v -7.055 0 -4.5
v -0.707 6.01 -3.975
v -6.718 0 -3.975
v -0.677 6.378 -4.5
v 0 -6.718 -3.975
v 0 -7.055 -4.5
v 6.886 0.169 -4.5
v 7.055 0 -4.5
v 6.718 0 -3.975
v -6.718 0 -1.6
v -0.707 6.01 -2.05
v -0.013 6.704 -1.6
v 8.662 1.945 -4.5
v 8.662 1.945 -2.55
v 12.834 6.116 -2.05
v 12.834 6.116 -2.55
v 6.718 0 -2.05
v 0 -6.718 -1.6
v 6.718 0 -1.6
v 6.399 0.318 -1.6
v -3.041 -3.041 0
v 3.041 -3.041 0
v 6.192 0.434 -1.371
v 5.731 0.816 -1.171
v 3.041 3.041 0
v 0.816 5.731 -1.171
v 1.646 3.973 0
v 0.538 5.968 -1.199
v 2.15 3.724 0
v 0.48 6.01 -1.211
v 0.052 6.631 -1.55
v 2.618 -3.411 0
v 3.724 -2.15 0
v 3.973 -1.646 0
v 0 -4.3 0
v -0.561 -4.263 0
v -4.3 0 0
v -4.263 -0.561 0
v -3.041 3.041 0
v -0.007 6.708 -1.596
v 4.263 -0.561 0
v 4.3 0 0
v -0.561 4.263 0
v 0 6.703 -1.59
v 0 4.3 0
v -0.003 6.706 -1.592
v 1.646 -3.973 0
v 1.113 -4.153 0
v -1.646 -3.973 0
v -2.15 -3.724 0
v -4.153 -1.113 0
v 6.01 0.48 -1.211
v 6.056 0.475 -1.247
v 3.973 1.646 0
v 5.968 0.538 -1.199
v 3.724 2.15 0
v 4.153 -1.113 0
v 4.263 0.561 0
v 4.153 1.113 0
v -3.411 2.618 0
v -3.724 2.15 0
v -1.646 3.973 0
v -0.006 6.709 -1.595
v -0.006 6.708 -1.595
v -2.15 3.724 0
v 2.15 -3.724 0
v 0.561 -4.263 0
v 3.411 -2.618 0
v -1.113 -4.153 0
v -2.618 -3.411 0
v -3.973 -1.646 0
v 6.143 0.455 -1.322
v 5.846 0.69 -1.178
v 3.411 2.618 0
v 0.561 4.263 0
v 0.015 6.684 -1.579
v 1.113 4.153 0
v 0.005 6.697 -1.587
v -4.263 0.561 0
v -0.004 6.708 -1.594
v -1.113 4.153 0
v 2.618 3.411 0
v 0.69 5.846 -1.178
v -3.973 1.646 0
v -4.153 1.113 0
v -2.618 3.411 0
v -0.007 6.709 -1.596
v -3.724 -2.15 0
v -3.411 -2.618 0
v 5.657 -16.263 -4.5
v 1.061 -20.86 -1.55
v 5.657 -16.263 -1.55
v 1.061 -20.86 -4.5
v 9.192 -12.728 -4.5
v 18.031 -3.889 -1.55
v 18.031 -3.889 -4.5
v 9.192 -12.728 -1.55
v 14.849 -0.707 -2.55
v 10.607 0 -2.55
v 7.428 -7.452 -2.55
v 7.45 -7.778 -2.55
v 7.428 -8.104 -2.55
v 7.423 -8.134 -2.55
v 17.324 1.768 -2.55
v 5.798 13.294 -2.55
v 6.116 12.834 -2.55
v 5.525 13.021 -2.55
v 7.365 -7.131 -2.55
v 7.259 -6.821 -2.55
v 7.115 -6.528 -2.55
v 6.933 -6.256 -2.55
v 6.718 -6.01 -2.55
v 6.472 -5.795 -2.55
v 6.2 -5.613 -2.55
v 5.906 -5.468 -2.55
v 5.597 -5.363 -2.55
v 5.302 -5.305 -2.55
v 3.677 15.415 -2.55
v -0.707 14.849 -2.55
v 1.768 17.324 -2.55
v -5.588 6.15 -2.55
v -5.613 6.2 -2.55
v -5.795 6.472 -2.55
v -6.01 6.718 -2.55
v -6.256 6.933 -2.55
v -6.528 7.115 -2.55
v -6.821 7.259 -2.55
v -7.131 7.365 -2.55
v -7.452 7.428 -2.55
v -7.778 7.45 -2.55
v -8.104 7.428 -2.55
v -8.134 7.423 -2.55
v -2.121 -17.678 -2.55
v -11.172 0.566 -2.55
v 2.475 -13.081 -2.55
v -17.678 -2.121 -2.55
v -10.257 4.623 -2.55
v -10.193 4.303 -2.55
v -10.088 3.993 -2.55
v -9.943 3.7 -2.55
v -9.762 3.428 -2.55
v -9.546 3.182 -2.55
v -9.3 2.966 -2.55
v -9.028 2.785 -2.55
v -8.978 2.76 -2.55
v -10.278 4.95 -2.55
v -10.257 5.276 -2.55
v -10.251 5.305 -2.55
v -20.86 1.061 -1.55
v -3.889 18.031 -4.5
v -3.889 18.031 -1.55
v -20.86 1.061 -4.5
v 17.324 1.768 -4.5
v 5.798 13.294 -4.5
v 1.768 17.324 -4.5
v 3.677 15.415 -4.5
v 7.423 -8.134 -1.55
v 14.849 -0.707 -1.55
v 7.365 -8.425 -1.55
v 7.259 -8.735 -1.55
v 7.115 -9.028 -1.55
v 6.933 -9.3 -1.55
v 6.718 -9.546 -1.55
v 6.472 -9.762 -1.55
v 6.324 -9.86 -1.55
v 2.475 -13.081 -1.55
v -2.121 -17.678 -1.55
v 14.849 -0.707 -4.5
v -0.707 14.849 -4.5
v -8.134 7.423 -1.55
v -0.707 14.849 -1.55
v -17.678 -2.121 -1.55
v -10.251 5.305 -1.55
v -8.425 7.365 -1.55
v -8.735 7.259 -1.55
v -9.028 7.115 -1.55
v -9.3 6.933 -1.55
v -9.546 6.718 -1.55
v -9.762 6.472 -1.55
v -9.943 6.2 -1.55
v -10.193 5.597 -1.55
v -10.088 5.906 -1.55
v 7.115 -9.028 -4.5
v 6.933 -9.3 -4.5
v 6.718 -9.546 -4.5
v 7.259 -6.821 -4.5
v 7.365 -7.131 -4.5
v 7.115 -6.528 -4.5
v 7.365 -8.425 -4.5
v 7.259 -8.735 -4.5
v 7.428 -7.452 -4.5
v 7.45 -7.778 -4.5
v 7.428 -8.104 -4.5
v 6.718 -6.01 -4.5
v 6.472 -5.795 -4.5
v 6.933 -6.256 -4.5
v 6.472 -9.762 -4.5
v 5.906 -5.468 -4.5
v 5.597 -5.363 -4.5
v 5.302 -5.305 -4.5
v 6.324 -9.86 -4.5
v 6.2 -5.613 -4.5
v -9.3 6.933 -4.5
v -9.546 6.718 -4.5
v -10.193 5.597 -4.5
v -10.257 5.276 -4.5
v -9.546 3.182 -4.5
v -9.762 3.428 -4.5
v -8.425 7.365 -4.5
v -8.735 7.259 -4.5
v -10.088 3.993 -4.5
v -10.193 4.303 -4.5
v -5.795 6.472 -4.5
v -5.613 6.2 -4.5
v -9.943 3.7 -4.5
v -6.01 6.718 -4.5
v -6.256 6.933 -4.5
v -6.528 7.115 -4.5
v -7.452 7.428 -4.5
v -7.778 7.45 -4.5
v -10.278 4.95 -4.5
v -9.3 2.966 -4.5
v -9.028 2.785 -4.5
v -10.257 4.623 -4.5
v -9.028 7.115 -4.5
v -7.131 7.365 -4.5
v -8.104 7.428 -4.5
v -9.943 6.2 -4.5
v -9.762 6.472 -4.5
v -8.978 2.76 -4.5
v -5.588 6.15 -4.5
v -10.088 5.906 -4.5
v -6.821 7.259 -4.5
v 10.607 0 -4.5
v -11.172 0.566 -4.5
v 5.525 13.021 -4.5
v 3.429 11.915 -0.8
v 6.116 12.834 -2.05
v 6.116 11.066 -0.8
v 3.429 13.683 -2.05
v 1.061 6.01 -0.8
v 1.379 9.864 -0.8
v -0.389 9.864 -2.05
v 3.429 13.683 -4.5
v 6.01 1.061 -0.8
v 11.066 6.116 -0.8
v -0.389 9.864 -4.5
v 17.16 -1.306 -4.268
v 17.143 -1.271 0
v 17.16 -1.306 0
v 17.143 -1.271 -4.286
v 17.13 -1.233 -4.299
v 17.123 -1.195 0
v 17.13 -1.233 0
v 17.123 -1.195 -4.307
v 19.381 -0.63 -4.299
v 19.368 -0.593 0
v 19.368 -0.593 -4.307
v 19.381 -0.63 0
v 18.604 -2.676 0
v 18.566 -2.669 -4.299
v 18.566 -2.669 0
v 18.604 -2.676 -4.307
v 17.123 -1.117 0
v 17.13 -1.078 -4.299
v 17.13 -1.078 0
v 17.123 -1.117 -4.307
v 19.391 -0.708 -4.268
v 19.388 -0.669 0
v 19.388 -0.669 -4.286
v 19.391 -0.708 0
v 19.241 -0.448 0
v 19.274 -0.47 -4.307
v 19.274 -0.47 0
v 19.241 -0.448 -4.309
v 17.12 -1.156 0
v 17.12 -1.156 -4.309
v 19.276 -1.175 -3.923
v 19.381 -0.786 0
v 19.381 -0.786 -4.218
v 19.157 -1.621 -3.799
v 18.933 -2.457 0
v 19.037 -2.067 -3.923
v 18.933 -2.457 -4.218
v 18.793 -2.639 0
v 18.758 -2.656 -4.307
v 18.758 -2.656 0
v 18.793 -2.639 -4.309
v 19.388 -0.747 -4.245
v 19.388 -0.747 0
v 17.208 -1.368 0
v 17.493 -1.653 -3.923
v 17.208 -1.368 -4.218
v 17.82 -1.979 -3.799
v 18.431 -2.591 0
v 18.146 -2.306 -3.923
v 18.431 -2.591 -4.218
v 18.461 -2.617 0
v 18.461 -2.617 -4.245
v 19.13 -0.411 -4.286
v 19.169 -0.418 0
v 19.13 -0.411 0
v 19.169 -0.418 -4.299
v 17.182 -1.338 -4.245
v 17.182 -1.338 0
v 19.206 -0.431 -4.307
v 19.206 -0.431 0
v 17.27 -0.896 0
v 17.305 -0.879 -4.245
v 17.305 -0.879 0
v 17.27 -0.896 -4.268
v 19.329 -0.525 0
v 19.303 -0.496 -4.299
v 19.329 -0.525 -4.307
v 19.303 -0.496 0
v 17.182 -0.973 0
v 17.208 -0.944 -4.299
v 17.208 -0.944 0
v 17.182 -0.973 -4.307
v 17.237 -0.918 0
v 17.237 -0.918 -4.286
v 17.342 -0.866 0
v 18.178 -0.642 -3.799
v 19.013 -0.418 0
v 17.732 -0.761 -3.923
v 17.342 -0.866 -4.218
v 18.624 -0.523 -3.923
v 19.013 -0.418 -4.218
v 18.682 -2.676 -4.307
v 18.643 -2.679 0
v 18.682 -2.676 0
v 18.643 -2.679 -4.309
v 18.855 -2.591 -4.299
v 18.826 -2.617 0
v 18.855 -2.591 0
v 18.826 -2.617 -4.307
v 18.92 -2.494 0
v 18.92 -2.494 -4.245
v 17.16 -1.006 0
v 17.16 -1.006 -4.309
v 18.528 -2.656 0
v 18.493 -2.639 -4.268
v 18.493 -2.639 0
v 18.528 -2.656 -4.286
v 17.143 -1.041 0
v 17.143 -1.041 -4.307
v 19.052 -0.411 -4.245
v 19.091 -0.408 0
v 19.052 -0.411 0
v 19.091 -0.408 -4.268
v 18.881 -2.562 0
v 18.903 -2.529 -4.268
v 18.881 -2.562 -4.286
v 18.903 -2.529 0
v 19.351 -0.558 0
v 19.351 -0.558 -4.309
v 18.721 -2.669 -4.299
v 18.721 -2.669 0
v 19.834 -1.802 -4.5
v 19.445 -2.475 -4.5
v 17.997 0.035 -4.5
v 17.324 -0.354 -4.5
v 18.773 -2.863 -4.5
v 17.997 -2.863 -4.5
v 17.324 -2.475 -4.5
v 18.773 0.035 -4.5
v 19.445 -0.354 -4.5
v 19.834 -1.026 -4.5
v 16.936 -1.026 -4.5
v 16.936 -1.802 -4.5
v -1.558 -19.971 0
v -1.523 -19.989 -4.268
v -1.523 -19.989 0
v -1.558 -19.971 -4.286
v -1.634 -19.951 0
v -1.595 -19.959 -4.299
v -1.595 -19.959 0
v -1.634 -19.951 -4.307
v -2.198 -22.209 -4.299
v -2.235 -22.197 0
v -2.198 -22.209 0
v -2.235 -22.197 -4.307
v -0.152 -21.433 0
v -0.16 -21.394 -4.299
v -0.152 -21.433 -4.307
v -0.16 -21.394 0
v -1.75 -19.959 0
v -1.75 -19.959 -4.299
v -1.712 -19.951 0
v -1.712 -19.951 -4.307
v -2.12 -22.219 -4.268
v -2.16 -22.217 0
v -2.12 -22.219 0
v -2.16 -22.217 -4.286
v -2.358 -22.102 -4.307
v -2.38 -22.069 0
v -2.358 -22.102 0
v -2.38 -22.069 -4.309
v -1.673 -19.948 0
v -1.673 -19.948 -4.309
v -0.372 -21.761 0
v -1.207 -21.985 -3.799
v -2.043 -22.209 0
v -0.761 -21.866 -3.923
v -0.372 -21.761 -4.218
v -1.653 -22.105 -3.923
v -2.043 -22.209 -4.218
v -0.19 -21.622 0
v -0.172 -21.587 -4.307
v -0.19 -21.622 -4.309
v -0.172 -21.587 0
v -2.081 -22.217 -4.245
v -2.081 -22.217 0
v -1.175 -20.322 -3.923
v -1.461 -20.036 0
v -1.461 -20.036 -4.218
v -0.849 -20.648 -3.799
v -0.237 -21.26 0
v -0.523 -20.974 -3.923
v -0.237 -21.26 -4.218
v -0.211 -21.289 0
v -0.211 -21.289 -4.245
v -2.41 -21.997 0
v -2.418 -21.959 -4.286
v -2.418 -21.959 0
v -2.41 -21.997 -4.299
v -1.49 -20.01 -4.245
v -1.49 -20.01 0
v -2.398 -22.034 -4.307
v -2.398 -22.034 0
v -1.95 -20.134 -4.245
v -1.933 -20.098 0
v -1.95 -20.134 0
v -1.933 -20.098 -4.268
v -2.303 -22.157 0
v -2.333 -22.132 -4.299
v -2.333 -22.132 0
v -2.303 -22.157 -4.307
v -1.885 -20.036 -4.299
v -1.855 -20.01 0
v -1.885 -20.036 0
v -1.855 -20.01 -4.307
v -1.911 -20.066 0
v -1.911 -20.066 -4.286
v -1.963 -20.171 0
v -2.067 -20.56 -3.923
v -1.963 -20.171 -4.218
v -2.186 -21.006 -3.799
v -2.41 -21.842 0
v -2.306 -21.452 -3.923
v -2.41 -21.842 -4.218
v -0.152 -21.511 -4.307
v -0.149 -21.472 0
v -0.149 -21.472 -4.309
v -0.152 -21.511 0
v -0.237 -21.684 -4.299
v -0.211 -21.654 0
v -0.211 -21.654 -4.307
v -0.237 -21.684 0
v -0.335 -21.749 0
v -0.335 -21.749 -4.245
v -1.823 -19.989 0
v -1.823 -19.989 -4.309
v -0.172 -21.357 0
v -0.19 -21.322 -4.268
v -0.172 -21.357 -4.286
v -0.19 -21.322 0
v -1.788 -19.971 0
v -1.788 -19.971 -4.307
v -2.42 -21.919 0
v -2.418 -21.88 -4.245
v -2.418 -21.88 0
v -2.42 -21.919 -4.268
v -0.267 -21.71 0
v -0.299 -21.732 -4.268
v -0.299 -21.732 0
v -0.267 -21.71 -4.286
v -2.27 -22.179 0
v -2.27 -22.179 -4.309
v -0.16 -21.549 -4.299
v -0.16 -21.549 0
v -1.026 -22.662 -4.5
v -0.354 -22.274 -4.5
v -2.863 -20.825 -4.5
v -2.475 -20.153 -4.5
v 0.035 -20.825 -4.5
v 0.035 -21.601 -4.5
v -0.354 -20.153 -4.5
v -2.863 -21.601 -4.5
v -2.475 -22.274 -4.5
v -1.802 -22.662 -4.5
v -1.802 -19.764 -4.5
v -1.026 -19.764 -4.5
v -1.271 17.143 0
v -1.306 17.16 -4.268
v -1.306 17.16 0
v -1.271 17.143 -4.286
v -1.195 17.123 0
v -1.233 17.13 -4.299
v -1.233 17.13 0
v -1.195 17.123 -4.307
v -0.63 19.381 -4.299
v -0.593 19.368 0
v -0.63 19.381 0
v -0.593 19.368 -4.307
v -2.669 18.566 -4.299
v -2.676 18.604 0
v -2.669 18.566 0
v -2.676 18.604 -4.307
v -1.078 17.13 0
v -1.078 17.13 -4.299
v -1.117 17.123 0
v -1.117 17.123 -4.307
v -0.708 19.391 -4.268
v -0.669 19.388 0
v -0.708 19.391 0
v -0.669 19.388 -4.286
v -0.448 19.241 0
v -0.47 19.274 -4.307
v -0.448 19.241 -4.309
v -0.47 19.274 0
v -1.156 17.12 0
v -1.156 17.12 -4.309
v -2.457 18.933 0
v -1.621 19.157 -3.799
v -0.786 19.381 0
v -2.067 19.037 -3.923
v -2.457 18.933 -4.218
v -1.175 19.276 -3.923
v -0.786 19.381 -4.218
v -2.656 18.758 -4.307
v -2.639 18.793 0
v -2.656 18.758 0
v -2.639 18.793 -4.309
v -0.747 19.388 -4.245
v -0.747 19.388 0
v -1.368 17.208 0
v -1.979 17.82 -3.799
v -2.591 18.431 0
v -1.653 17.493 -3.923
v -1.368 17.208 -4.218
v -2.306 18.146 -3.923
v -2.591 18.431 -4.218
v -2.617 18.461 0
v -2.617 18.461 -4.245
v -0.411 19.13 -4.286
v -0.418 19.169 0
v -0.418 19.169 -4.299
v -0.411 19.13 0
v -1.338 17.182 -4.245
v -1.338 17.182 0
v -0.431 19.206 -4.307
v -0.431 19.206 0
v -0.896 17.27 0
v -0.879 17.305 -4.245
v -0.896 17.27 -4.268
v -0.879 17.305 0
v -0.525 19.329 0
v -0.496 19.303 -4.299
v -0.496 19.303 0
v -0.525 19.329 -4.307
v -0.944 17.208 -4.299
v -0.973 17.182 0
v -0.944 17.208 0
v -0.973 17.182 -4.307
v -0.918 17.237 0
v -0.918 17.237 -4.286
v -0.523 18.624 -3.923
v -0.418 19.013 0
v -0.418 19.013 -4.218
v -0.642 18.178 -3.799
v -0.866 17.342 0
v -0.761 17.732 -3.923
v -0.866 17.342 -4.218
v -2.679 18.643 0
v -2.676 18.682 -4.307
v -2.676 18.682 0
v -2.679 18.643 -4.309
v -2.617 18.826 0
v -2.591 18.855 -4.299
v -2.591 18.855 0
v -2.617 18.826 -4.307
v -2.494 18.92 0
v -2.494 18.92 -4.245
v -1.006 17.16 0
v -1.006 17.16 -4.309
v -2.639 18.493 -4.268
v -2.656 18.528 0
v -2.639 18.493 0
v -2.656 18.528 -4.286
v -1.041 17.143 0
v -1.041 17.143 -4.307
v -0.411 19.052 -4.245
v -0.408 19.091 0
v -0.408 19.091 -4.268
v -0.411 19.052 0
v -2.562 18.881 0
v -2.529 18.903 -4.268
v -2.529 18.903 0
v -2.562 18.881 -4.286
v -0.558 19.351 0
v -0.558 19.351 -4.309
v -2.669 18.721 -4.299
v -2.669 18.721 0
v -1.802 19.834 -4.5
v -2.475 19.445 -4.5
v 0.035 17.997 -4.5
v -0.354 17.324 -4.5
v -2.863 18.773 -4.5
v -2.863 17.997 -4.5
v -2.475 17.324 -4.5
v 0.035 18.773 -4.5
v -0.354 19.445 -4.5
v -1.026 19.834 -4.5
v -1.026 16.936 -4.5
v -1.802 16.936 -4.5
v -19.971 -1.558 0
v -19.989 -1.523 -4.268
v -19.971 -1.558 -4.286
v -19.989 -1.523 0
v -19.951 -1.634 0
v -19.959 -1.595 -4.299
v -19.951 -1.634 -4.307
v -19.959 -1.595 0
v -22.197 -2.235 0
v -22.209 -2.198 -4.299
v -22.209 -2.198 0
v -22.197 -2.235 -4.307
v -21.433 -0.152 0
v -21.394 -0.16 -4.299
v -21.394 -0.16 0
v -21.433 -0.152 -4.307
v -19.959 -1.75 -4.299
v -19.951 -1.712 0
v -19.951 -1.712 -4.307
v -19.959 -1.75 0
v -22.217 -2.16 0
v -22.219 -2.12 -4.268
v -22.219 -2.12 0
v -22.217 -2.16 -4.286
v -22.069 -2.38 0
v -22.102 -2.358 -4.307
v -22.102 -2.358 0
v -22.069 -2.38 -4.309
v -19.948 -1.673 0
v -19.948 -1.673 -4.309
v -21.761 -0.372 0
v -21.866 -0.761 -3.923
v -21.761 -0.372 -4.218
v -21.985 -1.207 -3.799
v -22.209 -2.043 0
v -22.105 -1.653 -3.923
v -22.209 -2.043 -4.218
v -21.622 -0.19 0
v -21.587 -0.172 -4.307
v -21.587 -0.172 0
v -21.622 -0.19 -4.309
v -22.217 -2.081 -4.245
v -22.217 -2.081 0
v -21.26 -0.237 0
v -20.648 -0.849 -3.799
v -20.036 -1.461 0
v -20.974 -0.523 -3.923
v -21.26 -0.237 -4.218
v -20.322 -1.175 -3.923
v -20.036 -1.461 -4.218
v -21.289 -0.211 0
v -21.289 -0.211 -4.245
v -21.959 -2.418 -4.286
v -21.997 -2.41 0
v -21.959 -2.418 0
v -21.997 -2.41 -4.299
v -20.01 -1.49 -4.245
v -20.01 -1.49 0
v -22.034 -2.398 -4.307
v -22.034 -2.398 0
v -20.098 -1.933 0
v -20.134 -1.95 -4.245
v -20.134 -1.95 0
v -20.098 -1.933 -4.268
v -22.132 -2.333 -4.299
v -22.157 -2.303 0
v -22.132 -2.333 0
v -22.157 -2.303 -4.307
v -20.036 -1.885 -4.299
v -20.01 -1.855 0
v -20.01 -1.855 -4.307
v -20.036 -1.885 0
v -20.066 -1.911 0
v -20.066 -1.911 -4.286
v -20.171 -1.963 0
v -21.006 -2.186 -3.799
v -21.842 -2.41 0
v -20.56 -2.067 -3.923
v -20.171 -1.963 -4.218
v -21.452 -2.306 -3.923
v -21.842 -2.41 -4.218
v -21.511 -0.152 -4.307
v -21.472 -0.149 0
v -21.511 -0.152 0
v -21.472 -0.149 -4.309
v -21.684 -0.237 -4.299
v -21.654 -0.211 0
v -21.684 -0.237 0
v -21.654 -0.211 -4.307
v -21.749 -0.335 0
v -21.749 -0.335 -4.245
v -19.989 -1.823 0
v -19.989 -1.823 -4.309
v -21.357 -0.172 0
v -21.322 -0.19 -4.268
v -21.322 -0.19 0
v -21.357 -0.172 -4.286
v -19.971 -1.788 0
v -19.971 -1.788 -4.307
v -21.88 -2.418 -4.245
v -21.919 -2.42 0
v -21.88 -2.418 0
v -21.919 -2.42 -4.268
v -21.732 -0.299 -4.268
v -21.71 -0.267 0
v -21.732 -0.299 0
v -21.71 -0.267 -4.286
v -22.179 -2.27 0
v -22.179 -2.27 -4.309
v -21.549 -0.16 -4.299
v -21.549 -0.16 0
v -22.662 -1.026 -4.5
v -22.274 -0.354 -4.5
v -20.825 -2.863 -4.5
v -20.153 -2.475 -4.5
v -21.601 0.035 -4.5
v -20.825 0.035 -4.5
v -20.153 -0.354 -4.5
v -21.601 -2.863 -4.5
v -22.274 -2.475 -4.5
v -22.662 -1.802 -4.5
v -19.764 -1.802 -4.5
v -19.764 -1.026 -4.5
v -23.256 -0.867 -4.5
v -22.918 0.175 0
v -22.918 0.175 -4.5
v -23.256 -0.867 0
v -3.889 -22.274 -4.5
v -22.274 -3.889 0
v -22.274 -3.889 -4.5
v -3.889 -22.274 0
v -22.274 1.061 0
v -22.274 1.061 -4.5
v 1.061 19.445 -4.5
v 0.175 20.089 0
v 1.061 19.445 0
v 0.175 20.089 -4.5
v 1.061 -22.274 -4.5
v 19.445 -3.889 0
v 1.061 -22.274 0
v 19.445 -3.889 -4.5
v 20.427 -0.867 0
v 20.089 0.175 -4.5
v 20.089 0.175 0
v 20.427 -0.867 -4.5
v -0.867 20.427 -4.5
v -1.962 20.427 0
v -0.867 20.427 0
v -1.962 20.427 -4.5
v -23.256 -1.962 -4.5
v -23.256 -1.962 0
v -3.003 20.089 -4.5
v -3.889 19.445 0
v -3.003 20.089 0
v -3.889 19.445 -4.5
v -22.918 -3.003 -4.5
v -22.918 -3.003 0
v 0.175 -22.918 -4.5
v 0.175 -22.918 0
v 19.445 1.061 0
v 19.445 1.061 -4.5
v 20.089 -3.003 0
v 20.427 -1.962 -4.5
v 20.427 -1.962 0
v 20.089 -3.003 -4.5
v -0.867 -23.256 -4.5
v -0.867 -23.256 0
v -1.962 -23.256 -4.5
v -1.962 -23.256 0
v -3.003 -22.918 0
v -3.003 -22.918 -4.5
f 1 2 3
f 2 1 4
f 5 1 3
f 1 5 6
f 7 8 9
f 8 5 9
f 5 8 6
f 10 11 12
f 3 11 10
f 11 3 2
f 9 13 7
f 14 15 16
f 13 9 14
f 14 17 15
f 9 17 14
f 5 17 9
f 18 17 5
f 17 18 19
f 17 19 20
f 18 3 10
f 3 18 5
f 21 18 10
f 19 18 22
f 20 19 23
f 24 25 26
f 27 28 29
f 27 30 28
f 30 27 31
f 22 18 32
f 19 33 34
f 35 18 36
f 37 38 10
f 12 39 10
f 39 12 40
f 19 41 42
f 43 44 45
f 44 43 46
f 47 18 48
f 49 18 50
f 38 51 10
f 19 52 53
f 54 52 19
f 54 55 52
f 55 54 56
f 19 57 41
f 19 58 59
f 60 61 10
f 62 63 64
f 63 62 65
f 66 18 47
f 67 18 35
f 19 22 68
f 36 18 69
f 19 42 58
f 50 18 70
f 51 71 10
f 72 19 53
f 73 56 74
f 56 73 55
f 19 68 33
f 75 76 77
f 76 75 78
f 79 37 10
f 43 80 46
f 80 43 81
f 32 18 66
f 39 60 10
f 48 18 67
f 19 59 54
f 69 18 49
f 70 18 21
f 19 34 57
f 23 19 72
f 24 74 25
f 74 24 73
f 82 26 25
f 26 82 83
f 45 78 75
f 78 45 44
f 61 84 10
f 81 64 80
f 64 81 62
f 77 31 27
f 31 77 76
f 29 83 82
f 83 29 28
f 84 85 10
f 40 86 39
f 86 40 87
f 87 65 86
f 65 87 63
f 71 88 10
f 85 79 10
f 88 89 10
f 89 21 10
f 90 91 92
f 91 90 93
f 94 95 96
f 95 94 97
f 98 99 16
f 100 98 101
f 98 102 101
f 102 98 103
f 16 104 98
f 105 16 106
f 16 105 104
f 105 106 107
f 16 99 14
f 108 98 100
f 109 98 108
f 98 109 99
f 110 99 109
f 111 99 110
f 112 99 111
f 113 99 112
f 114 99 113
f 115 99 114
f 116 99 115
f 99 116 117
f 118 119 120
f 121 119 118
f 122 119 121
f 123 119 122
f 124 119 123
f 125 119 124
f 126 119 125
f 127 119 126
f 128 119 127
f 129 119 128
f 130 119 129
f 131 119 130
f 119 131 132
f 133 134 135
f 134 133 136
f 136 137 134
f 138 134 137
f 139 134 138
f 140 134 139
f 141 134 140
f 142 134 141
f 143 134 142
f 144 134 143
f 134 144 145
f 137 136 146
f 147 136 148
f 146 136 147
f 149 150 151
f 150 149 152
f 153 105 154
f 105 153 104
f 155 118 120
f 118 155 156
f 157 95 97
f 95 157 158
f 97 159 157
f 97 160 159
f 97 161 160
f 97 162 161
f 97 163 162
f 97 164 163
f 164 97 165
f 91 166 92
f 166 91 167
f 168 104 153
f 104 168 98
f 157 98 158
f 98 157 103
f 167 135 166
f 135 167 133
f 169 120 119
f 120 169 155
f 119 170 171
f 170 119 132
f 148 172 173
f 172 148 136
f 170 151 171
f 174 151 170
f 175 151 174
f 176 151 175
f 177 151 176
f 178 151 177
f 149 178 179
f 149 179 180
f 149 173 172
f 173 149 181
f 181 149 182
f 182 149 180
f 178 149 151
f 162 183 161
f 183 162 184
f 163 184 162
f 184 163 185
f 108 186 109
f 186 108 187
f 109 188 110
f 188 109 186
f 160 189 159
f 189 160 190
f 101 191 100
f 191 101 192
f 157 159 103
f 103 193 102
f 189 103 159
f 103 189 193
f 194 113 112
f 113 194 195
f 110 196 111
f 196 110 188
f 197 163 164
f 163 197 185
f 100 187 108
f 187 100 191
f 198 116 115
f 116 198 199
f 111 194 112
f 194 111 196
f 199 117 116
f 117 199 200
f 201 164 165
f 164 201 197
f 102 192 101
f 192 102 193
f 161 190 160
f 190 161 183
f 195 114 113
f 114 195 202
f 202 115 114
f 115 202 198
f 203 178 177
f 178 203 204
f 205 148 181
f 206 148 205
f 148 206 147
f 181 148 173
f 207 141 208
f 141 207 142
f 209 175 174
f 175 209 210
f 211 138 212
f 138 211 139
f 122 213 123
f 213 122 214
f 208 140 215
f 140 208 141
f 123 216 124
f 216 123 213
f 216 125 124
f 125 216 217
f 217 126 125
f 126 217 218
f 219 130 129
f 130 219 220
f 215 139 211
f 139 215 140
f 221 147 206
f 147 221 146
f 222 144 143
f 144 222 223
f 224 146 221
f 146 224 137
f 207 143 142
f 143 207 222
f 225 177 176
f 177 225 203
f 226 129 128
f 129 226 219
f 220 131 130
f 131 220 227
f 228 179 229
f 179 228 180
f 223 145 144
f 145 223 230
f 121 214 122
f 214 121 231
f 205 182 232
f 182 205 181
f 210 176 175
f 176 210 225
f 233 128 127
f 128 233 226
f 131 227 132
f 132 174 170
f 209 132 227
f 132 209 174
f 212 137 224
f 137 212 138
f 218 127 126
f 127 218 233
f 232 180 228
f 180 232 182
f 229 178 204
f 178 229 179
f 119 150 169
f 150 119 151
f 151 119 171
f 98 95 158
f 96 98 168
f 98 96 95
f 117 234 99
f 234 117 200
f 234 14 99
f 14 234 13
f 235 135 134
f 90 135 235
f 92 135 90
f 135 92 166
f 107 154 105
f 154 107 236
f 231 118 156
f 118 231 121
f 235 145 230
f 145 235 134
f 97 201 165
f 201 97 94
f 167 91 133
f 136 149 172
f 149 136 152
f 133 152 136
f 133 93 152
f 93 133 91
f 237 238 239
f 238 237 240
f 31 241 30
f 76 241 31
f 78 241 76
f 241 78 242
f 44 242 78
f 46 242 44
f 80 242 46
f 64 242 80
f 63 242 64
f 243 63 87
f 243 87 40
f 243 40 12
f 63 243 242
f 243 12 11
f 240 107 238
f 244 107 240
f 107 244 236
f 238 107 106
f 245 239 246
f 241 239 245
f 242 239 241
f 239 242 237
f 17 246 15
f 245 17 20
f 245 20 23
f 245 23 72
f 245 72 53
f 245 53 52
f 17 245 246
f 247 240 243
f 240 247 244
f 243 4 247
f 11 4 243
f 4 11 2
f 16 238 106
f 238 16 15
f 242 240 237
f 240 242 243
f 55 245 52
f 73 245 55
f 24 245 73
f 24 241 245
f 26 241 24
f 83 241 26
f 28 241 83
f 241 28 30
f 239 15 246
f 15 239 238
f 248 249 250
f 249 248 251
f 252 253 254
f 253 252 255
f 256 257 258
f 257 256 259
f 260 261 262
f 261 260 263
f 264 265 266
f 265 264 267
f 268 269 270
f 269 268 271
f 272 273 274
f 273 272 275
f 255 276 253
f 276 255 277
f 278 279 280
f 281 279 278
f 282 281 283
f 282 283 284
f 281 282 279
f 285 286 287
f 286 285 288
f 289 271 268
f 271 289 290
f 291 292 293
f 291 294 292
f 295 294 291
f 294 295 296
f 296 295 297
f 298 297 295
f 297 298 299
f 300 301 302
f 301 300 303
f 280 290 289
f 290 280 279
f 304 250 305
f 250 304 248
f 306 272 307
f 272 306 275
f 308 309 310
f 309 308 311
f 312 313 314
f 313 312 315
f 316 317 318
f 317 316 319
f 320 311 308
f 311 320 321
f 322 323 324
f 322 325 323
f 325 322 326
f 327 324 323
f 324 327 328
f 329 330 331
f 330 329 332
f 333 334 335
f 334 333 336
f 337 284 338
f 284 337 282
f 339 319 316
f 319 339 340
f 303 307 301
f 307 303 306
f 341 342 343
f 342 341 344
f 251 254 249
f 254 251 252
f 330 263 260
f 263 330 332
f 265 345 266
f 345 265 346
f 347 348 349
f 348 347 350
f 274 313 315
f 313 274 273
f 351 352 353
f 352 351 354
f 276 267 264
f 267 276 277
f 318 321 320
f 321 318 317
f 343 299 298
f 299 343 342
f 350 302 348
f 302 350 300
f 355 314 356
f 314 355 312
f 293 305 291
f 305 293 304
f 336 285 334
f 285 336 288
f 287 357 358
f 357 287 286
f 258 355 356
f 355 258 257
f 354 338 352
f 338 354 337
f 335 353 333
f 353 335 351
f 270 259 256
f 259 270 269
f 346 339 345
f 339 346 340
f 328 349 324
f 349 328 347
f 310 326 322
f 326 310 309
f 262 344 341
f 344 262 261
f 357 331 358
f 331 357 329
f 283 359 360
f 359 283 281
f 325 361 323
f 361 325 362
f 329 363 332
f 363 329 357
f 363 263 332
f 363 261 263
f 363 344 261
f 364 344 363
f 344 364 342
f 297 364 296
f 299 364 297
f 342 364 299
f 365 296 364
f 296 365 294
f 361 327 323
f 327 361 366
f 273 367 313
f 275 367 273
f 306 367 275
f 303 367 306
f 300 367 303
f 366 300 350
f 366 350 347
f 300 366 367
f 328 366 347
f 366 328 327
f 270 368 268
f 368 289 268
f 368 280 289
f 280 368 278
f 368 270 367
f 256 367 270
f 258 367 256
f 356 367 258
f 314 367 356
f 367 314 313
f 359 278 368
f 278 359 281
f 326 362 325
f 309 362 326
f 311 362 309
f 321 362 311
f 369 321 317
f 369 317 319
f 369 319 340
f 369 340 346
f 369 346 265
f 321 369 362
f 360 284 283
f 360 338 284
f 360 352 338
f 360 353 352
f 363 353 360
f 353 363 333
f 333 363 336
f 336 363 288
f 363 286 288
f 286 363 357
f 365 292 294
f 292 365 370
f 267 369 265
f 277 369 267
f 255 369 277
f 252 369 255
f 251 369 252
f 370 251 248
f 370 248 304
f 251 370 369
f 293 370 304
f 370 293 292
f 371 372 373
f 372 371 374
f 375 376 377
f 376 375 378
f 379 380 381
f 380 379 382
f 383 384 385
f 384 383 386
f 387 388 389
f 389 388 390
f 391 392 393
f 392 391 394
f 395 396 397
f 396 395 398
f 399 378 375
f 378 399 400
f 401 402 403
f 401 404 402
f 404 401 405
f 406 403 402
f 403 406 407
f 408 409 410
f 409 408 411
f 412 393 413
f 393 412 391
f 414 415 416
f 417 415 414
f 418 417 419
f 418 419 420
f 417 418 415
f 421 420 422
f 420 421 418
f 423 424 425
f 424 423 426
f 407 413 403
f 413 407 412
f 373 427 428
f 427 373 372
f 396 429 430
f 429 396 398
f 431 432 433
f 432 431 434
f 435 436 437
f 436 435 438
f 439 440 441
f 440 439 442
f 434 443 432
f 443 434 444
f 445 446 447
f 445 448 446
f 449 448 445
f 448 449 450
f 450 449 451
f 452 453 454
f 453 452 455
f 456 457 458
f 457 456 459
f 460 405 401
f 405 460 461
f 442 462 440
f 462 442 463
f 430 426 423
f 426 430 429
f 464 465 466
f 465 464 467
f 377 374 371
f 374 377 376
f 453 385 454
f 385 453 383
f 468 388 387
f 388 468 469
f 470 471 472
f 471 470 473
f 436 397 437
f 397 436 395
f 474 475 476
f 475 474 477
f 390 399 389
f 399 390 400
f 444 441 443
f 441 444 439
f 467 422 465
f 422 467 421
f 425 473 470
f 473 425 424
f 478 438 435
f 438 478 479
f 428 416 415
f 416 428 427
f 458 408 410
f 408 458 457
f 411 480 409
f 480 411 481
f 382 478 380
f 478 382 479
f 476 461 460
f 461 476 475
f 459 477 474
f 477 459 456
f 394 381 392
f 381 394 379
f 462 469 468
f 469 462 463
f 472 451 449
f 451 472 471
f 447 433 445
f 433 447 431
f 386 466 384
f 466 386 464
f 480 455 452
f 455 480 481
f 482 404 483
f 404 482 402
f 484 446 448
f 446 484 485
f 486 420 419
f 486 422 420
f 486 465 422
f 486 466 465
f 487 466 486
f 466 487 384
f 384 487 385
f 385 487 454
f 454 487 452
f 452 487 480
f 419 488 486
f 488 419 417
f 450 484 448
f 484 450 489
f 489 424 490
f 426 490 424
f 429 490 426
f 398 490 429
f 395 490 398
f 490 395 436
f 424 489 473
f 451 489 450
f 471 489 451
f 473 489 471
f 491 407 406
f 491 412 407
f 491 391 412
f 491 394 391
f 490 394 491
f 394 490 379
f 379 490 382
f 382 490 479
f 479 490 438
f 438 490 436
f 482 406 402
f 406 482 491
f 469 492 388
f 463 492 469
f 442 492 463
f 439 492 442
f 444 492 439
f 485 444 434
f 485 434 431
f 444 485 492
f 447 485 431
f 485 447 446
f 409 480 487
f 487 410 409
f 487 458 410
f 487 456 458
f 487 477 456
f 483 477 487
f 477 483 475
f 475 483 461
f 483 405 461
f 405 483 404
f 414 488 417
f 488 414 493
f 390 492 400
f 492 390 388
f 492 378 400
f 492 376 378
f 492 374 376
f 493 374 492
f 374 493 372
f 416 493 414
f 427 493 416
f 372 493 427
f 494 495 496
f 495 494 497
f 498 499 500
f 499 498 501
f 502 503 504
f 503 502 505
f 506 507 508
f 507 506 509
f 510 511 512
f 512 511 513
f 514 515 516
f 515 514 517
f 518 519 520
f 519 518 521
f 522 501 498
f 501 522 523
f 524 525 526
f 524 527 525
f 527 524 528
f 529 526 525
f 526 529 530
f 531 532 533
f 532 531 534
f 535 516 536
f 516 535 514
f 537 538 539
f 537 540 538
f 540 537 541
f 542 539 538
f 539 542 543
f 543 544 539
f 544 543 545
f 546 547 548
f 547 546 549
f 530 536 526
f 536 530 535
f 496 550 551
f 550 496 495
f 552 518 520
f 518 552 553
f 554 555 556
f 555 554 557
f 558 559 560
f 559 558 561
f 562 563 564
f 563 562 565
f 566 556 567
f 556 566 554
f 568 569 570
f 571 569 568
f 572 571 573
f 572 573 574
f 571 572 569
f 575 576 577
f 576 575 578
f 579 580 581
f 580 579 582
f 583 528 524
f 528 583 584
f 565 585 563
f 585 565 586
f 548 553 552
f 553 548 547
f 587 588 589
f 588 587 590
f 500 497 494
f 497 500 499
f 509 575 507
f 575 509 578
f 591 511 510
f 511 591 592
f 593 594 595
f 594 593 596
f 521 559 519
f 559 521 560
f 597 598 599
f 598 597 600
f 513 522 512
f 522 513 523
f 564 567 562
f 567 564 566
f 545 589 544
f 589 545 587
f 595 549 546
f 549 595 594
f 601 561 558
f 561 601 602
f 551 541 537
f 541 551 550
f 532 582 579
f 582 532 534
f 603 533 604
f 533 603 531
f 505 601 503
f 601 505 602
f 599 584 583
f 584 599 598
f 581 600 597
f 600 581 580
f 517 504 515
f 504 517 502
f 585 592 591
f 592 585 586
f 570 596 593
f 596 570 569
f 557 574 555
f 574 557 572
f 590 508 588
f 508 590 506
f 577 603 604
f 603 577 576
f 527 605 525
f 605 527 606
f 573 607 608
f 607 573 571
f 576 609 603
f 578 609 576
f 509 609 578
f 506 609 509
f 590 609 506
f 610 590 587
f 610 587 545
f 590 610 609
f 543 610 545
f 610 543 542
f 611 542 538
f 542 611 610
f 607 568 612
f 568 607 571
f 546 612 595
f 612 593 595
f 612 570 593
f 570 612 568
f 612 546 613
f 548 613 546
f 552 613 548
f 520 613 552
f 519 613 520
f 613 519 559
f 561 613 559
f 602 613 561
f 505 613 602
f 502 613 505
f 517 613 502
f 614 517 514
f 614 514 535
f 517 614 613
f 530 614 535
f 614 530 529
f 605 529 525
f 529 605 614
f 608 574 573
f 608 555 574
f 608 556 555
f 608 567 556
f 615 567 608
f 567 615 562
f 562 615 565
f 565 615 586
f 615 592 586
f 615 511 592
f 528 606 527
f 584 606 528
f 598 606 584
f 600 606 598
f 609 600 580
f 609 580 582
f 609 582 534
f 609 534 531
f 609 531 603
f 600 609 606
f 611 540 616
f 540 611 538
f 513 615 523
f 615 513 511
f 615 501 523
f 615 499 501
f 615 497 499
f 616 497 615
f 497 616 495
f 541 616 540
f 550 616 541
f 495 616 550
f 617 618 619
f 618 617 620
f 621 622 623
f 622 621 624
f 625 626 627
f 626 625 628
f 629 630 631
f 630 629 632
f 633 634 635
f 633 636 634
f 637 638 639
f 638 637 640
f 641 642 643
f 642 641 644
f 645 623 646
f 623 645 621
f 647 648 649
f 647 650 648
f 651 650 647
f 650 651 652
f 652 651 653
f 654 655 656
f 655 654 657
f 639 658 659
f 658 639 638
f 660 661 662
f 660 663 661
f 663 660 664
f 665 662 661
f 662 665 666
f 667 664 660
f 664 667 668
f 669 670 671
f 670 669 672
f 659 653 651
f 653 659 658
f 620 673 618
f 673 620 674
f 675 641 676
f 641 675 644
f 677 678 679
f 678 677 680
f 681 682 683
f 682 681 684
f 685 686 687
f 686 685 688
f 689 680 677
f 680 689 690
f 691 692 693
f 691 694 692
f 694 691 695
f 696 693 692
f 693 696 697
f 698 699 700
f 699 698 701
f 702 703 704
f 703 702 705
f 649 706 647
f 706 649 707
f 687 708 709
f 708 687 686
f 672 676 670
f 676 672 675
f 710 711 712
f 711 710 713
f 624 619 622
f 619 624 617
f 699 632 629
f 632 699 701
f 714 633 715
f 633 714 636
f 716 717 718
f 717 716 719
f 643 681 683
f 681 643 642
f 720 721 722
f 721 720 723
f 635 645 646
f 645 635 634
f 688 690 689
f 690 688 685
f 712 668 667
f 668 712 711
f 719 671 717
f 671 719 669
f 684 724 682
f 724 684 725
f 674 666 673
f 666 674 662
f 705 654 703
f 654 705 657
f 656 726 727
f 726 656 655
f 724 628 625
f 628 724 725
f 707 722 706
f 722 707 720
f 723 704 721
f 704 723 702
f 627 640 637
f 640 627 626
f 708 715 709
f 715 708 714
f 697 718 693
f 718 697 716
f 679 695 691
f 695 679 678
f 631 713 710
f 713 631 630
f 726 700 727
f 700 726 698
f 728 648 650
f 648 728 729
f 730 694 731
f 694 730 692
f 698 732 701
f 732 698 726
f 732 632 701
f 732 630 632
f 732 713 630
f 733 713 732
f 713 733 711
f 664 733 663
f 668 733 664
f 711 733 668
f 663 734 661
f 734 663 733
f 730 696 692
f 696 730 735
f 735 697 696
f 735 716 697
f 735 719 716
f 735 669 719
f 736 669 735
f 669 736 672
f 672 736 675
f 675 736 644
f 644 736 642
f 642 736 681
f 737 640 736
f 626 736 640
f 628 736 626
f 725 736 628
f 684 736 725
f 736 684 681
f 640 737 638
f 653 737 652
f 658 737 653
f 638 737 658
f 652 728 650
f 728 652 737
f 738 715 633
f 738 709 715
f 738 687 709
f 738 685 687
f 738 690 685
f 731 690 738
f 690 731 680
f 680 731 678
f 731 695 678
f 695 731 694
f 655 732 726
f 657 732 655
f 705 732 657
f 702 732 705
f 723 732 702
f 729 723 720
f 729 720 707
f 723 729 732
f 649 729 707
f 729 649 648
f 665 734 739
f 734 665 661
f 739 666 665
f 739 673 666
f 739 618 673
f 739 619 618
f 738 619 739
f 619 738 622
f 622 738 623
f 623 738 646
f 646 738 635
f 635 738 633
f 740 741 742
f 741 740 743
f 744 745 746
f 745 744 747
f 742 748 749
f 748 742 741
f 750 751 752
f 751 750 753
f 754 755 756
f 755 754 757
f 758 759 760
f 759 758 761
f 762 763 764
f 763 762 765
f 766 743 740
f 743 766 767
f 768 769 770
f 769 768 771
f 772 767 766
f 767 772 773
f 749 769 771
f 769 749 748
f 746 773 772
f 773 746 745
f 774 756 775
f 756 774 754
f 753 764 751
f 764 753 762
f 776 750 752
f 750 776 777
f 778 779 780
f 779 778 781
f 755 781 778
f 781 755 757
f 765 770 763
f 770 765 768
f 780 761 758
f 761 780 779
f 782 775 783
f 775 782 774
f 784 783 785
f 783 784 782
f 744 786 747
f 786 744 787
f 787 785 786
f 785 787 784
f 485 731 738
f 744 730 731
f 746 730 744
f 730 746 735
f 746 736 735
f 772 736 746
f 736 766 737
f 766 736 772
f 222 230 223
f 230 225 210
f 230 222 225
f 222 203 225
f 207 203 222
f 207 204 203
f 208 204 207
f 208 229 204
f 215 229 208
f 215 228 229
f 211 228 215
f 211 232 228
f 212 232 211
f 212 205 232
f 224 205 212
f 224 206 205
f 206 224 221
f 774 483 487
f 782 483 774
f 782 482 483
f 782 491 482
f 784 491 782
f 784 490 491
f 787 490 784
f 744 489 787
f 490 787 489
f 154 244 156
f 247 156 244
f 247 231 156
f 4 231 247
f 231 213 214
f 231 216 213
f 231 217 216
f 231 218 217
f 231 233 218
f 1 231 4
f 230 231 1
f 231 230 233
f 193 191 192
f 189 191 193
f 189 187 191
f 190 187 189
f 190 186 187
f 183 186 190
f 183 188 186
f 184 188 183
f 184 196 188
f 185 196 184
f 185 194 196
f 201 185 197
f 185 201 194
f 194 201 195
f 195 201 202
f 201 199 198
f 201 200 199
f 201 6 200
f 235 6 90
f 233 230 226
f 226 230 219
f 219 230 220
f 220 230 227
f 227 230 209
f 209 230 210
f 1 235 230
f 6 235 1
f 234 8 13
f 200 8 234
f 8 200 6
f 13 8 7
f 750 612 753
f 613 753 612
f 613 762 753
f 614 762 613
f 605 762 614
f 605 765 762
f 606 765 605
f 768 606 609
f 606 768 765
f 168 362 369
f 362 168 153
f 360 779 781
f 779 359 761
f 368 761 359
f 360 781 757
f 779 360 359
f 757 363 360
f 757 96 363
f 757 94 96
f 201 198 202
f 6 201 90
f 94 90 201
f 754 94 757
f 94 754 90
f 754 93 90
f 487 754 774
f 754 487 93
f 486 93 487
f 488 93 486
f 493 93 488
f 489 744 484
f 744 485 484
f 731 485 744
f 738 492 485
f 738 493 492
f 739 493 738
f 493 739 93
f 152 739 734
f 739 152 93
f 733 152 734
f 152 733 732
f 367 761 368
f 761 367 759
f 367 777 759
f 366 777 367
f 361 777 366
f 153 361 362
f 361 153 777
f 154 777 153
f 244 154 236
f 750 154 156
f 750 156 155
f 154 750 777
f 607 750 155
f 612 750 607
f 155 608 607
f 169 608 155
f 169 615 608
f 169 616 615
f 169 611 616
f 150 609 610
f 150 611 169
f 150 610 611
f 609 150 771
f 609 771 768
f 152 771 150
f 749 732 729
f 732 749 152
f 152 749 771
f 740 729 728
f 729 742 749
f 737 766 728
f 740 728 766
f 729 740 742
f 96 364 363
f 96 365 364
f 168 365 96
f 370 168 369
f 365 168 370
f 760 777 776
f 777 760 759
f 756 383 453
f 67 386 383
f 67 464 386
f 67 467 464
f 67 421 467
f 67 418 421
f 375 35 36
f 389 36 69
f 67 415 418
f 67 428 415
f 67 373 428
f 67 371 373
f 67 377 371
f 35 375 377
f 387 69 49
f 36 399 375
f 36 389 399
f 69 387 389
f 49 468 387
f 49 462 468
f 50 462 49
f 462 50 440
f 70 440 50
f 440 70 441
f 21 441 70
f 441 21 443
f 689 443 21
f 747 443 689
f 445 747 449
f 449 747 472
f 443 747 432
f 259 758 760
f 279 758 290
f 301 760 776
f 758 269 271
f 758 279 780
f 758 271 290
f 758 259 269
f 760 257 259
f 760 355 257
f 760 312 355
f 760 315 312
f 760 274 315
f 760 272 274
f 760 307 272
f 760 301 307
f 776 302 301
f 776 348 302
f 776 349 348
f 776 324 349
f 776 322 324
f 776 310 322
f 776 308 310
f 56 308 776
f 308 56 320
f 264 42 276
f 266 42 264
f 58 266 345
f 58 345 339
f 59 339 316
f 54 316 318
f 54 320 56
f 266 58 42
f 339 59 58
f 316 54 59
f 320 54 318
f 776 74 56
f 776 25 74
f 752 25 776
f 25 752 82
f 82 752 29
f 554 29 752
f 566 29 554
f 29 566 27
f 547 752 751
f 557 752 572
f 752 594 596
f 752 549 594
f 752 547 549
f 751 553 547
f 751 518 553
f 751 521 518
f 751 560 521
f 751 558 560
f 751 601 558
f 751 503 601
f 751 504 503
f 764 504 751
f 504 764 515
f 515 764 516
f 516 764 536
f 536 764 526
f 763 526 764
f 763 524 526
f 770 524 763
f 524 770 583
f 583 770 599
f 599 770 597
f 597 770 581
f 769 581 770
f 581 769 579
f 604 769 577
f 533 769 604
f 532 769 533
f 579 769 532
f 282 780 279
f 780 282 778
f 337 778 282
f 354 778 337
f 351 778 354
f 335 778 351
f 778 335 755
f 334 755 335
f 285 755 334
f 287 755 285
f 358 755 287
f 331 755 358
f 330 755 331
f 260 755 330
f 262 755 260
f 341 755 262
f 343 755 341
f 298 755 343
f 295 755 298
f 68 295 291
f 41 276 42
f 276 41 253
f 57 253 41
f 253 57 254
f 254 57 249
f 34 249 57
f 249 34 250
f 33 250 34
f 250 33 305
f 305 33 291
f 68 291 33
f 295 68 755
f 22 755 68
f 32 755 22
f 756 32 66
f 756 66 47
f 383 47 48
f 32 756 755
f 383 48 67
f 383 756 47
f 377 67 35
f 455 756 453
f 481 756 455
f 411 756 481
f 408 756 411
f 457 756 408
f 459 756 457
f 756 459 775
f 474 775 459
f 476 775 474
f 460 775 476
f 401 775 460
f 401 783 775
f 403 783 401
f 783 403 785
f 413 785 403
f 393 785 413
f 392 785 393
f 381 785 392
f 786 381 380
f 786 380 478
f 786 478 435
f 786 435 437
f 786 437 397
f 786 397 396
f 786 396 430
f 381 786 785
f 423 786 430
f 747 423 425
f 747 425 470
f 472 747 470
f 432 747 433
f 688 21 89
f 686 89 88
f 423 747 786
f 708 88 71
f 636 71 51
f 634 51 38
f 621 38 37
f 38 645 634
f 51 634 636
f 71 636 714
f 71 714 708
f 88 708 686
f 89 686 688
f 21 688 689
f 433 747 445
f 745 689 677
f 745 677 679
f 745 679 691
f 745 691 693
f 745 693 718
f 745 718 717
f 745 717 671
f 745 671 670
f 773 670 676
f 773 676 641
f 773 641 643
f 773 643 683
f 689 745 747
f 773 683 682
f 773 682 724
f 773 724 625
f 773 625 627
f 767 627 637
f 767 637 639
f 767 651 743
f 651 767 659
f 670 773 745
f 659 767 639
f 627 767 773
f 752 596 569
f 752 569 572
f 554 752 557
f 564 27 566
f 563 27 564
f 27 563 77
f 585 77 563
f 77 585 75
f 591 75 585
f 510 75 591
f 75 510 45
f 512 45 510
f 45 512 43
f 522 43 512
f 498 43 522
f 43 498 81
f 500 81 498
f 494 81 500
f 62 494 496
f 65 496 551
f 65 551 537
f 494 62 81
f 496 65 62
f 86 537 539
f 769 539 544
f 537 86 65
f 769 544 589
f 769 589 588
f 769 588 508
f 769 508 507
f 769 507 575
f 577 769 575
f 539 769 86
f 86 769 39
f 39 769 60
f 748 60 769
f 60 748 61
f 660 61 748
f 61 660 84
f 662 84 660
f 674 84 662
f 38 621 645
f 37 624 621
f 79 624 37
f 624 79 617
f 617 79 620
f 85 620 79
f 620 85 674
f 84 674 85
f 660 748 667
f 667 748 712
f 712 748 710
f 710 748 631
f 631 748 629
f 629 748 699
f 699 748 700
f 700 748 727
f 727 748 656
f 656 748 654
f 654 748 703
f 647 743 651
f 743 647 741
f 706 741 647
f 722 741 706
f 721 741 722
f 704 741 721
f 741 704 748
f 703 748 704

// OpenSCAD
// file: ../libdict.scad
// This library add dictionary like features to openscad
// the dictionary is a list of pairs as we cannot define new types.
// Unlike a python dictionary we cannot do a proper hash table for speed
// so everything is build around the OpenSCAD search function
// There are a lot of assert statements to ensure data in the "dictionary"
// is in the format of
// * A list of lists
// * Each internal list has a length of two
// * First element of each internal list is a string (the key)
// * All keys are unique.


// Private function:
// This function returns true if the value is in the list
// value must be a string.
// No error checking, for use by is_in only!
function _is_in_str(value, list) =
    search([value], list) != [[]];

// Private function:
// This function returns true if the value is in the list
// value must be a number.
// No error checking, for use by is_in only!
function _is_in_num(value, list) =
    search(value, list) != [];


// This function returns true if the value is in the list
// value must be a string or a number.
function is_in(value, list) =
    assert(is_num(value) || is_string(value) , "is_in: value must be a number or string")
    assert(is_list(list), "is_in: list must be a list")
    is_num(value) ? _is_in_num(value, list) : _is_in_str(value, list);

/**
 * Sum a list
 * This recursive function sums a list.  It should be called with one
 * argument (the list); the other two arguments simply allow it to be
 * "tail-recursive" which lets OpenSCAD optimise it better.  This is
 * very close to the example given in the OpenSCAD docs.
 */
function _libdict_sum_list(list, starting_element=0, running_total=0) =
    starting_element >= len(list) ?
        running_total :
        _libdict_sum_list(list, starting_element + 1, running_total + list[starting_element]);

/**
 * When checking a list for uniqueness, we can get "errant matches".
 * An errant match is when a non-list matches with the first element in a list.
 * i.e. it would consider [1, [1,0]] to be non-unique. We cannot know which 
 * element is the non-list but we do know that it is errant if exactly one 
 * of them is not a list.
 * If two elements are non-lists, they must be identical in order to have matched.  
 * Similarly, if all elements are lists, they must be identical because ``search`` 
 * will have matched them as whole lists.
 * The argument "list" is the list we are checking for uniqueness, and "match" is 
 * a vector of indices that have been returned by ``search``.
 */
function _check_errant_match(list, match) = let(
    non_list = [for (m = match) is_list(list[m])? 0 : 1],
    number_of_non_lists = _libdict_sum_list(non_list)
) number_of_non_lists == 1 ? 0 : 1;

// Returns true if all emements in list are unique.
function is_unique(list) =
    assert(is_list(list), "is_unique: list must be a list")
    let(
        matches = search(list, list, 0),
        // Assign 1 or 0 depending on is the match length for each element
        // return wether any matches are greater than one (mathcing more than
        // itself)
        // note cannot search for true or false so using 1 and zero
        bool_list = [for (match = matches) if (len(match)==1) 0
            // should put a 1 here to show they matched but in the case of
            // [1, [1]] it will match both, so need to check if they are
            // both lists or both not list
            else _check_errant_match(list, match)]
    ) !is_in(1, bool_list);

// Private function:
// Checks that the input is a list and that every element is a list
// of length 2.
// No error checking, for use by valid_dict only!
function _is_pairs(list) =
    !is_list(list) ? false :
        len(list)==0 ? false :
            !is_in(0, [for (pair = list) is_list(pair) && len(pair)==2 ? 1: 0]);

// Private function:
// Checks all elements in the list are strings
// No error checking, for use by valid_dict only!
// Strings can't be empty
function _is_list_of_strings(list) =
    !is_in(0, [for (item = list) is_string(item) && len(item)>0 ? 1: 0]);

// Private function:
// Returns the keus in a dictionary
// No error checking, for use by valid_dict only!
function _keylist(dict)  = [for (pair=dict) pair[0]];

function valid_dict(dict) =
    //if the input are not pairs return instantly
    !_is_pairs(dict) ? false : let (
        //if they are pairs get all keys
        keys = _keylist(dict),
        all_strings =  _is_list_of_strings(keys),
        unique = is_unique(keys)
    ) (all_strings && unique) ? true : false;

// Key lookup for key value pair "dictionary".
// Unlike the built in lookup this works with strings.
function key_lookup(key, dict) =
    assert(is_string(key), "`key` must be a string")
    assert(valid_dict(dict), "`dict` must be a valid 'dictionary'")
    let(
        // key is in [] because otherwise openscad will search for each letter rather than the string.
        index = search([key], dict, 1, 0)[0]
    )  assert (index!=[], "Key lookup failed, key not found!") dict[index][1];

// Creates a new dictionary with a key value pair replaced. Pair must already
// be in dictionary.
function replace_value(key, value, dict) =
    assert(is_string(key), "`key` must be a string")
    assert(valid_dict(dict), "`dict` must be a valid 'dictionary'")
    assert(is_in(key, _keylist(dict)), "`key` not found in dictionary!")
    [for (kv_pair = dict) key!=kv_pair[0] ? kv_pair : [key, value]];


// Creates a new dictionary with a a set of key value pair replaced
// both inputs must be a dictionary. All keys in input must already be
// in dictionary
function replace_multiple_values(rep_dict, dict) =
    assert(valid_dict(rep_dict), "`rep dict` must be a valid 'dictionary'")
    assert(valid_dict(dict), "`dict` must be a valid 'dictionary'")
    let(
        // loop over all keys in replacement dict checking they are in the original
        rep_keys = [for (key = _keylist(rep_dict))
            assert(is_in(key, _keylist(dict)), "`key` not found in dictionary!")
            key
        ]
    ) //Finally return the updated dictionary using this long list comprehension.
    [
        for (kv_pair = dict) let(
            key = kv_pair[0],
            // check if this key is in the replacement dictionary and if so return index
            // key is in [] because otherwise openscad will search for each letter rather
            // than the string.
            index = search([key], rep_dict, 1, 0)[0]
            // if index is empty return original key value pair, else return the key with
            // the replaced value
        ) index == [] ? kv_pair : [key, rep_dict[index][1]]
    ];
// main file
/******************************************************************
*                                                                 *
* OpenFlexure Microscope: Arducam B0196 screw-on-from-bottm mount *
*         Sony IMX219 sensor, USB 'UVC' compliant                 *
*                                                                 *
* This is part of the OpenFlexure microscope, an open-source      *
* microscope and 3-axis translation stage.  It gets really good   *
* precision over a ~10mm range, by using plastic flexure          *
* mechanisms.                                                     *
*                                                                 *
* This file defines a camera mount (together with functions that  *
* return the mount height and sensor position) for the Arducam    *
* B0196 webcam.                                                   *
*                                                                 *
*                                                                 *
* (c) Richard Bowman, January 2016                                *
* Released under the CERN Open Hardware License                   *
*                                                                 *
******************************************************************/


use <../utilities.scad>
use <../libdict.scad>
use <./picamera_2.scad> // to use the sensor cutout, as it is the same sensor

$fn=48;

function arducam_b0196_camera_dict() = [["mount_height", 4.5],
                                        ["sensor_height", 2]];//Height of the sensor above the PCB

function arducam_b0196_camera_bottom_z() = -key_lookup("mount_height", arducam_b0196_camera_dict());

function arducam_b0196_corner_hole_spacing() = 28/2;
function arducam_b0196_sensor_hole_spacing() = 18/2;
function arducam_offset_y() = 2; // the sensor is offset towards the ribbom cable

module b0196(beam_h=9){
    //cut-out to fit Arducam B0196 webcam
    //optical axis at (0,0)
    //top of PCB at (0,0,0)

    // This module is designed to be subtracted from the bottom of a shape.
    // The z=0 plane should be the print bed.
    // It includes cut-outs for the components on the PCB and also a push-fit hole
    // for the camera module.  
    // mirror([0,0,1]){ //parts cut out of the mount are z<0

    mount_height = key_lookup("mount_height", arducam_b0196_camera_dict());
    //width camera box (NOTE: this is deliberately loose fitting)
    camera_width = 8.5 + 1.0;
    //height of camera box (including foam support)
    camera_height=2.9;

    //size of camera aperture
    hole_r = 4.3;
    union(){
        sequential_hull(){
            //cut-out for camera (/wider at bottom)
            translate_z(-tiny()){
                cube([camera_width+0.5,camera_width+0.5,tiny()],center=true);
            }
            translate_z(0.5){
                cube([camera_width,camera_width,tiny()],center=true);
            }
            translate_z(camera_height/2){
                cube([camera_width,camera_width,camera_height],center=true);
            }
            cylinder(r=hole_r, h=2*mount_height, center=true);
        }

        //clearance for the ribbon cable at top of camera
        flex_h=2.5; // the height of the flex

        extra_h = mount_height-flex_h-0.75; // extra height above the flex for the sloping "roof"
        hull(){
            translate_z(-tiny()){
                linear_extrude(flex_h){
                    picam2_flex_and_components(camera_width);
                }
            }
            translate_z(-tiny()){
                linear_extrude(flex_h+extra_h){
                    offset(-extra_h){
                        picam2_flex_and_components(camera_width);
                    }
                }
            }
        }

        //beam clearance
        cylinder(r=hole_r, h=beam_h);

        close_hole_xy = arducam_b0196_sensor_hole_spacing();
        //Component clearance
        translate_z(2/2-tiny()){
            difference(){
                union(){
                    // main block for clearance over 1.5mm components
                    translate_y(-arducam_offset_y()){
                        cube([31,31,2],center = true);
                    }
                    // stepped region to cope with bridging
                    translate([-4.5/2+31/2,-arducam_offset_y(),0]){
                        cube([4.5,31,4],center = true);
                    }
                    translate([+4.5/2-31/2,-arducam_offset_y(),0]){
                        cube([4.5,31,4],center = true);
                    }
                }
                union(){
                    // part surrounding camera
                    cube([15,15,3], center = true);
                    translate([-6.8,3.5,0]){
                        cube([3,22,3],center = true);
                    }
                    translate([+8,-5,0]){
                        cube([16,5,5],center = true);
                    }
                    // pillars at mounting points
                    translate_y(-arducam_offset_y()){
                         reflect_x(){
                                translate([close_hole_xy,0,0]){
                                    cylinder(d=5, h=99,center = true);
                                }
                            }
                        }
                    // bar at top and part at bottom
                    translate([0,(7.0/2)-38/2-arducam_offset_y(),0]){
                        cube([34,7.0,5],center = true);
                    }
                    translate([0,-(7.0/2)+38/2-arducam_offset_y(),0]){
                        difference(){
                            cube([34,7.0,5],center = true);
                            cube([(38-16),9.0,6],center = true);
                        }
                    }
                }
            }
        }
    }
}

//b0196();
arducam_b0196_camera_mount();
//picam2_cutout();

module arducam_rounded_block(b=33, w=33, h=6, roc = 2){
    // a rounded block with the dimensions of the inner board of the Arducam B0196
    // slot cutouts on the corners above 1mm+tiny
    // centred on the origin
    linear_extrude(h){
        hull(){
            reflect([1,0]){
                reflect([0,1]){
                    translate([w/2-roc, b/2-roc]){
                        circle(r=roc,$fn=20);
                    }
                }
            }
        }
    }
}

module arducam_b0196_camera_mount(screwhole=true){
    // A mount for the Arducam B0196 USB camera
    // This should finish at z=0+tiny(), with a surface that can be
    // hull-ed onto the lens assembly.
    w = 33;
    b = 33;

    mounting_hole_xy = arducam_b0196_corner_hole_spacing();

    mount_height = key_lookup("mount_height", arducam_b0196_camera_dict());
    rotate(-45){
        difference(){
            translate([0*-w/2, 0*-b/2 -arducam_offset_y(), -mount_height]){
                arducam_rounded_block(w=w, b=b, h=mount_height, roc=3.5);
            }
            translate_z(-mount_height){
                b0196();
                // mounting holes at the four corners
                if(screwhole){
                    translate_y(-arducam_offset_y()){
                        reflect_x(){
                            reflect_y(){
                                translate([mounting_hole_xy, mounting_hole_xy,0]){
                                    no2_selftap_hole(h=6);
                                    // chamfer in base to overcome overextrusion
                                    translate_z(-0.5){
                                        cylinder(r1=2,h=2,r2=0,$fn=12);
                                    }
                                }
                            }
                        }
                    }
                }
            }
        }
    }
}

// Counterbore mounting holes for the lens spacer to screw on from above
module b0196_counterbore(){
    // clearance holes
    translate_z(arducam_b0196_camera_bottom_z()-1){
        at_b0196_hole_pattern(){
            cylinder(r=1.25, h=9, $fn=12);
        }
    }
    // counterbore holes, nomminally diameter 4.5, print at 4 to fit screw heads
    translate_z(arducam_b0196_camera_bottom_z()+1.5){
        at_b0196_hole_pattern(){
            cylinder(r=2.25, h=9, $fn=12);
        }
    }
    // Enlarged countebore for screwdriver, nominally diameter 5.5
    translate_z(arducam_b0196_camera_bottom_z()+4){
        at_b0196_hole_pattern(){
            cylinder(r=2.75, h=9, $fn=12);
        }
    }
}

module b0196_camera_bottom_mounting_posts(optics_config, outers=true, cutouts=true, bottom_slice=false){
    if (bottom_slice){
        //if we want the bottom slice intersect with the bottom of the whole
        //post found by recalling the function
        intersection(){
            cylinder(h=tiny(), r=99);
            b0196_camera_bottom_mounting_posts(optics_config, outers=outers, cutouts=cutouts);
        }
    }
    else{
        // posts to mount to arduino B0196 camera from below
        r1=3;
        r2=2.5;
        h = key_lookup("mounting_post_height", optics_config);
        at_b0196_hole_pattern(){
            difference(){
                if(outers){
                    cylinder(r1=r1, r2=r2, h=h, $fn=12);
                }
                if(cutouts){
                    translate_z(h-6+tiny()){
                        no2_selftap_hole(h=6);
                    }
                }
            }
        }
    }
}

module at_b0196_hole_pattern(){

    screw_xy = arducam_b0196_corner_hole_spacing();
    close_screw_xy = arducam_b0196_sensor_hole_spacing();
    mount_holes = [[screw_xy,screw_xy,0],
                    [-screw_xy,-screw_xy,0],
                    [close_screw_xy,0,0],
                    [-close_screw_xy,0,0]];
    rotate(-45){
        translate_y(-arducam_offset_y()){
            for(pos=mount_holes){
                translate(pos){
                    children();
                }
            }
        }
    }
}
